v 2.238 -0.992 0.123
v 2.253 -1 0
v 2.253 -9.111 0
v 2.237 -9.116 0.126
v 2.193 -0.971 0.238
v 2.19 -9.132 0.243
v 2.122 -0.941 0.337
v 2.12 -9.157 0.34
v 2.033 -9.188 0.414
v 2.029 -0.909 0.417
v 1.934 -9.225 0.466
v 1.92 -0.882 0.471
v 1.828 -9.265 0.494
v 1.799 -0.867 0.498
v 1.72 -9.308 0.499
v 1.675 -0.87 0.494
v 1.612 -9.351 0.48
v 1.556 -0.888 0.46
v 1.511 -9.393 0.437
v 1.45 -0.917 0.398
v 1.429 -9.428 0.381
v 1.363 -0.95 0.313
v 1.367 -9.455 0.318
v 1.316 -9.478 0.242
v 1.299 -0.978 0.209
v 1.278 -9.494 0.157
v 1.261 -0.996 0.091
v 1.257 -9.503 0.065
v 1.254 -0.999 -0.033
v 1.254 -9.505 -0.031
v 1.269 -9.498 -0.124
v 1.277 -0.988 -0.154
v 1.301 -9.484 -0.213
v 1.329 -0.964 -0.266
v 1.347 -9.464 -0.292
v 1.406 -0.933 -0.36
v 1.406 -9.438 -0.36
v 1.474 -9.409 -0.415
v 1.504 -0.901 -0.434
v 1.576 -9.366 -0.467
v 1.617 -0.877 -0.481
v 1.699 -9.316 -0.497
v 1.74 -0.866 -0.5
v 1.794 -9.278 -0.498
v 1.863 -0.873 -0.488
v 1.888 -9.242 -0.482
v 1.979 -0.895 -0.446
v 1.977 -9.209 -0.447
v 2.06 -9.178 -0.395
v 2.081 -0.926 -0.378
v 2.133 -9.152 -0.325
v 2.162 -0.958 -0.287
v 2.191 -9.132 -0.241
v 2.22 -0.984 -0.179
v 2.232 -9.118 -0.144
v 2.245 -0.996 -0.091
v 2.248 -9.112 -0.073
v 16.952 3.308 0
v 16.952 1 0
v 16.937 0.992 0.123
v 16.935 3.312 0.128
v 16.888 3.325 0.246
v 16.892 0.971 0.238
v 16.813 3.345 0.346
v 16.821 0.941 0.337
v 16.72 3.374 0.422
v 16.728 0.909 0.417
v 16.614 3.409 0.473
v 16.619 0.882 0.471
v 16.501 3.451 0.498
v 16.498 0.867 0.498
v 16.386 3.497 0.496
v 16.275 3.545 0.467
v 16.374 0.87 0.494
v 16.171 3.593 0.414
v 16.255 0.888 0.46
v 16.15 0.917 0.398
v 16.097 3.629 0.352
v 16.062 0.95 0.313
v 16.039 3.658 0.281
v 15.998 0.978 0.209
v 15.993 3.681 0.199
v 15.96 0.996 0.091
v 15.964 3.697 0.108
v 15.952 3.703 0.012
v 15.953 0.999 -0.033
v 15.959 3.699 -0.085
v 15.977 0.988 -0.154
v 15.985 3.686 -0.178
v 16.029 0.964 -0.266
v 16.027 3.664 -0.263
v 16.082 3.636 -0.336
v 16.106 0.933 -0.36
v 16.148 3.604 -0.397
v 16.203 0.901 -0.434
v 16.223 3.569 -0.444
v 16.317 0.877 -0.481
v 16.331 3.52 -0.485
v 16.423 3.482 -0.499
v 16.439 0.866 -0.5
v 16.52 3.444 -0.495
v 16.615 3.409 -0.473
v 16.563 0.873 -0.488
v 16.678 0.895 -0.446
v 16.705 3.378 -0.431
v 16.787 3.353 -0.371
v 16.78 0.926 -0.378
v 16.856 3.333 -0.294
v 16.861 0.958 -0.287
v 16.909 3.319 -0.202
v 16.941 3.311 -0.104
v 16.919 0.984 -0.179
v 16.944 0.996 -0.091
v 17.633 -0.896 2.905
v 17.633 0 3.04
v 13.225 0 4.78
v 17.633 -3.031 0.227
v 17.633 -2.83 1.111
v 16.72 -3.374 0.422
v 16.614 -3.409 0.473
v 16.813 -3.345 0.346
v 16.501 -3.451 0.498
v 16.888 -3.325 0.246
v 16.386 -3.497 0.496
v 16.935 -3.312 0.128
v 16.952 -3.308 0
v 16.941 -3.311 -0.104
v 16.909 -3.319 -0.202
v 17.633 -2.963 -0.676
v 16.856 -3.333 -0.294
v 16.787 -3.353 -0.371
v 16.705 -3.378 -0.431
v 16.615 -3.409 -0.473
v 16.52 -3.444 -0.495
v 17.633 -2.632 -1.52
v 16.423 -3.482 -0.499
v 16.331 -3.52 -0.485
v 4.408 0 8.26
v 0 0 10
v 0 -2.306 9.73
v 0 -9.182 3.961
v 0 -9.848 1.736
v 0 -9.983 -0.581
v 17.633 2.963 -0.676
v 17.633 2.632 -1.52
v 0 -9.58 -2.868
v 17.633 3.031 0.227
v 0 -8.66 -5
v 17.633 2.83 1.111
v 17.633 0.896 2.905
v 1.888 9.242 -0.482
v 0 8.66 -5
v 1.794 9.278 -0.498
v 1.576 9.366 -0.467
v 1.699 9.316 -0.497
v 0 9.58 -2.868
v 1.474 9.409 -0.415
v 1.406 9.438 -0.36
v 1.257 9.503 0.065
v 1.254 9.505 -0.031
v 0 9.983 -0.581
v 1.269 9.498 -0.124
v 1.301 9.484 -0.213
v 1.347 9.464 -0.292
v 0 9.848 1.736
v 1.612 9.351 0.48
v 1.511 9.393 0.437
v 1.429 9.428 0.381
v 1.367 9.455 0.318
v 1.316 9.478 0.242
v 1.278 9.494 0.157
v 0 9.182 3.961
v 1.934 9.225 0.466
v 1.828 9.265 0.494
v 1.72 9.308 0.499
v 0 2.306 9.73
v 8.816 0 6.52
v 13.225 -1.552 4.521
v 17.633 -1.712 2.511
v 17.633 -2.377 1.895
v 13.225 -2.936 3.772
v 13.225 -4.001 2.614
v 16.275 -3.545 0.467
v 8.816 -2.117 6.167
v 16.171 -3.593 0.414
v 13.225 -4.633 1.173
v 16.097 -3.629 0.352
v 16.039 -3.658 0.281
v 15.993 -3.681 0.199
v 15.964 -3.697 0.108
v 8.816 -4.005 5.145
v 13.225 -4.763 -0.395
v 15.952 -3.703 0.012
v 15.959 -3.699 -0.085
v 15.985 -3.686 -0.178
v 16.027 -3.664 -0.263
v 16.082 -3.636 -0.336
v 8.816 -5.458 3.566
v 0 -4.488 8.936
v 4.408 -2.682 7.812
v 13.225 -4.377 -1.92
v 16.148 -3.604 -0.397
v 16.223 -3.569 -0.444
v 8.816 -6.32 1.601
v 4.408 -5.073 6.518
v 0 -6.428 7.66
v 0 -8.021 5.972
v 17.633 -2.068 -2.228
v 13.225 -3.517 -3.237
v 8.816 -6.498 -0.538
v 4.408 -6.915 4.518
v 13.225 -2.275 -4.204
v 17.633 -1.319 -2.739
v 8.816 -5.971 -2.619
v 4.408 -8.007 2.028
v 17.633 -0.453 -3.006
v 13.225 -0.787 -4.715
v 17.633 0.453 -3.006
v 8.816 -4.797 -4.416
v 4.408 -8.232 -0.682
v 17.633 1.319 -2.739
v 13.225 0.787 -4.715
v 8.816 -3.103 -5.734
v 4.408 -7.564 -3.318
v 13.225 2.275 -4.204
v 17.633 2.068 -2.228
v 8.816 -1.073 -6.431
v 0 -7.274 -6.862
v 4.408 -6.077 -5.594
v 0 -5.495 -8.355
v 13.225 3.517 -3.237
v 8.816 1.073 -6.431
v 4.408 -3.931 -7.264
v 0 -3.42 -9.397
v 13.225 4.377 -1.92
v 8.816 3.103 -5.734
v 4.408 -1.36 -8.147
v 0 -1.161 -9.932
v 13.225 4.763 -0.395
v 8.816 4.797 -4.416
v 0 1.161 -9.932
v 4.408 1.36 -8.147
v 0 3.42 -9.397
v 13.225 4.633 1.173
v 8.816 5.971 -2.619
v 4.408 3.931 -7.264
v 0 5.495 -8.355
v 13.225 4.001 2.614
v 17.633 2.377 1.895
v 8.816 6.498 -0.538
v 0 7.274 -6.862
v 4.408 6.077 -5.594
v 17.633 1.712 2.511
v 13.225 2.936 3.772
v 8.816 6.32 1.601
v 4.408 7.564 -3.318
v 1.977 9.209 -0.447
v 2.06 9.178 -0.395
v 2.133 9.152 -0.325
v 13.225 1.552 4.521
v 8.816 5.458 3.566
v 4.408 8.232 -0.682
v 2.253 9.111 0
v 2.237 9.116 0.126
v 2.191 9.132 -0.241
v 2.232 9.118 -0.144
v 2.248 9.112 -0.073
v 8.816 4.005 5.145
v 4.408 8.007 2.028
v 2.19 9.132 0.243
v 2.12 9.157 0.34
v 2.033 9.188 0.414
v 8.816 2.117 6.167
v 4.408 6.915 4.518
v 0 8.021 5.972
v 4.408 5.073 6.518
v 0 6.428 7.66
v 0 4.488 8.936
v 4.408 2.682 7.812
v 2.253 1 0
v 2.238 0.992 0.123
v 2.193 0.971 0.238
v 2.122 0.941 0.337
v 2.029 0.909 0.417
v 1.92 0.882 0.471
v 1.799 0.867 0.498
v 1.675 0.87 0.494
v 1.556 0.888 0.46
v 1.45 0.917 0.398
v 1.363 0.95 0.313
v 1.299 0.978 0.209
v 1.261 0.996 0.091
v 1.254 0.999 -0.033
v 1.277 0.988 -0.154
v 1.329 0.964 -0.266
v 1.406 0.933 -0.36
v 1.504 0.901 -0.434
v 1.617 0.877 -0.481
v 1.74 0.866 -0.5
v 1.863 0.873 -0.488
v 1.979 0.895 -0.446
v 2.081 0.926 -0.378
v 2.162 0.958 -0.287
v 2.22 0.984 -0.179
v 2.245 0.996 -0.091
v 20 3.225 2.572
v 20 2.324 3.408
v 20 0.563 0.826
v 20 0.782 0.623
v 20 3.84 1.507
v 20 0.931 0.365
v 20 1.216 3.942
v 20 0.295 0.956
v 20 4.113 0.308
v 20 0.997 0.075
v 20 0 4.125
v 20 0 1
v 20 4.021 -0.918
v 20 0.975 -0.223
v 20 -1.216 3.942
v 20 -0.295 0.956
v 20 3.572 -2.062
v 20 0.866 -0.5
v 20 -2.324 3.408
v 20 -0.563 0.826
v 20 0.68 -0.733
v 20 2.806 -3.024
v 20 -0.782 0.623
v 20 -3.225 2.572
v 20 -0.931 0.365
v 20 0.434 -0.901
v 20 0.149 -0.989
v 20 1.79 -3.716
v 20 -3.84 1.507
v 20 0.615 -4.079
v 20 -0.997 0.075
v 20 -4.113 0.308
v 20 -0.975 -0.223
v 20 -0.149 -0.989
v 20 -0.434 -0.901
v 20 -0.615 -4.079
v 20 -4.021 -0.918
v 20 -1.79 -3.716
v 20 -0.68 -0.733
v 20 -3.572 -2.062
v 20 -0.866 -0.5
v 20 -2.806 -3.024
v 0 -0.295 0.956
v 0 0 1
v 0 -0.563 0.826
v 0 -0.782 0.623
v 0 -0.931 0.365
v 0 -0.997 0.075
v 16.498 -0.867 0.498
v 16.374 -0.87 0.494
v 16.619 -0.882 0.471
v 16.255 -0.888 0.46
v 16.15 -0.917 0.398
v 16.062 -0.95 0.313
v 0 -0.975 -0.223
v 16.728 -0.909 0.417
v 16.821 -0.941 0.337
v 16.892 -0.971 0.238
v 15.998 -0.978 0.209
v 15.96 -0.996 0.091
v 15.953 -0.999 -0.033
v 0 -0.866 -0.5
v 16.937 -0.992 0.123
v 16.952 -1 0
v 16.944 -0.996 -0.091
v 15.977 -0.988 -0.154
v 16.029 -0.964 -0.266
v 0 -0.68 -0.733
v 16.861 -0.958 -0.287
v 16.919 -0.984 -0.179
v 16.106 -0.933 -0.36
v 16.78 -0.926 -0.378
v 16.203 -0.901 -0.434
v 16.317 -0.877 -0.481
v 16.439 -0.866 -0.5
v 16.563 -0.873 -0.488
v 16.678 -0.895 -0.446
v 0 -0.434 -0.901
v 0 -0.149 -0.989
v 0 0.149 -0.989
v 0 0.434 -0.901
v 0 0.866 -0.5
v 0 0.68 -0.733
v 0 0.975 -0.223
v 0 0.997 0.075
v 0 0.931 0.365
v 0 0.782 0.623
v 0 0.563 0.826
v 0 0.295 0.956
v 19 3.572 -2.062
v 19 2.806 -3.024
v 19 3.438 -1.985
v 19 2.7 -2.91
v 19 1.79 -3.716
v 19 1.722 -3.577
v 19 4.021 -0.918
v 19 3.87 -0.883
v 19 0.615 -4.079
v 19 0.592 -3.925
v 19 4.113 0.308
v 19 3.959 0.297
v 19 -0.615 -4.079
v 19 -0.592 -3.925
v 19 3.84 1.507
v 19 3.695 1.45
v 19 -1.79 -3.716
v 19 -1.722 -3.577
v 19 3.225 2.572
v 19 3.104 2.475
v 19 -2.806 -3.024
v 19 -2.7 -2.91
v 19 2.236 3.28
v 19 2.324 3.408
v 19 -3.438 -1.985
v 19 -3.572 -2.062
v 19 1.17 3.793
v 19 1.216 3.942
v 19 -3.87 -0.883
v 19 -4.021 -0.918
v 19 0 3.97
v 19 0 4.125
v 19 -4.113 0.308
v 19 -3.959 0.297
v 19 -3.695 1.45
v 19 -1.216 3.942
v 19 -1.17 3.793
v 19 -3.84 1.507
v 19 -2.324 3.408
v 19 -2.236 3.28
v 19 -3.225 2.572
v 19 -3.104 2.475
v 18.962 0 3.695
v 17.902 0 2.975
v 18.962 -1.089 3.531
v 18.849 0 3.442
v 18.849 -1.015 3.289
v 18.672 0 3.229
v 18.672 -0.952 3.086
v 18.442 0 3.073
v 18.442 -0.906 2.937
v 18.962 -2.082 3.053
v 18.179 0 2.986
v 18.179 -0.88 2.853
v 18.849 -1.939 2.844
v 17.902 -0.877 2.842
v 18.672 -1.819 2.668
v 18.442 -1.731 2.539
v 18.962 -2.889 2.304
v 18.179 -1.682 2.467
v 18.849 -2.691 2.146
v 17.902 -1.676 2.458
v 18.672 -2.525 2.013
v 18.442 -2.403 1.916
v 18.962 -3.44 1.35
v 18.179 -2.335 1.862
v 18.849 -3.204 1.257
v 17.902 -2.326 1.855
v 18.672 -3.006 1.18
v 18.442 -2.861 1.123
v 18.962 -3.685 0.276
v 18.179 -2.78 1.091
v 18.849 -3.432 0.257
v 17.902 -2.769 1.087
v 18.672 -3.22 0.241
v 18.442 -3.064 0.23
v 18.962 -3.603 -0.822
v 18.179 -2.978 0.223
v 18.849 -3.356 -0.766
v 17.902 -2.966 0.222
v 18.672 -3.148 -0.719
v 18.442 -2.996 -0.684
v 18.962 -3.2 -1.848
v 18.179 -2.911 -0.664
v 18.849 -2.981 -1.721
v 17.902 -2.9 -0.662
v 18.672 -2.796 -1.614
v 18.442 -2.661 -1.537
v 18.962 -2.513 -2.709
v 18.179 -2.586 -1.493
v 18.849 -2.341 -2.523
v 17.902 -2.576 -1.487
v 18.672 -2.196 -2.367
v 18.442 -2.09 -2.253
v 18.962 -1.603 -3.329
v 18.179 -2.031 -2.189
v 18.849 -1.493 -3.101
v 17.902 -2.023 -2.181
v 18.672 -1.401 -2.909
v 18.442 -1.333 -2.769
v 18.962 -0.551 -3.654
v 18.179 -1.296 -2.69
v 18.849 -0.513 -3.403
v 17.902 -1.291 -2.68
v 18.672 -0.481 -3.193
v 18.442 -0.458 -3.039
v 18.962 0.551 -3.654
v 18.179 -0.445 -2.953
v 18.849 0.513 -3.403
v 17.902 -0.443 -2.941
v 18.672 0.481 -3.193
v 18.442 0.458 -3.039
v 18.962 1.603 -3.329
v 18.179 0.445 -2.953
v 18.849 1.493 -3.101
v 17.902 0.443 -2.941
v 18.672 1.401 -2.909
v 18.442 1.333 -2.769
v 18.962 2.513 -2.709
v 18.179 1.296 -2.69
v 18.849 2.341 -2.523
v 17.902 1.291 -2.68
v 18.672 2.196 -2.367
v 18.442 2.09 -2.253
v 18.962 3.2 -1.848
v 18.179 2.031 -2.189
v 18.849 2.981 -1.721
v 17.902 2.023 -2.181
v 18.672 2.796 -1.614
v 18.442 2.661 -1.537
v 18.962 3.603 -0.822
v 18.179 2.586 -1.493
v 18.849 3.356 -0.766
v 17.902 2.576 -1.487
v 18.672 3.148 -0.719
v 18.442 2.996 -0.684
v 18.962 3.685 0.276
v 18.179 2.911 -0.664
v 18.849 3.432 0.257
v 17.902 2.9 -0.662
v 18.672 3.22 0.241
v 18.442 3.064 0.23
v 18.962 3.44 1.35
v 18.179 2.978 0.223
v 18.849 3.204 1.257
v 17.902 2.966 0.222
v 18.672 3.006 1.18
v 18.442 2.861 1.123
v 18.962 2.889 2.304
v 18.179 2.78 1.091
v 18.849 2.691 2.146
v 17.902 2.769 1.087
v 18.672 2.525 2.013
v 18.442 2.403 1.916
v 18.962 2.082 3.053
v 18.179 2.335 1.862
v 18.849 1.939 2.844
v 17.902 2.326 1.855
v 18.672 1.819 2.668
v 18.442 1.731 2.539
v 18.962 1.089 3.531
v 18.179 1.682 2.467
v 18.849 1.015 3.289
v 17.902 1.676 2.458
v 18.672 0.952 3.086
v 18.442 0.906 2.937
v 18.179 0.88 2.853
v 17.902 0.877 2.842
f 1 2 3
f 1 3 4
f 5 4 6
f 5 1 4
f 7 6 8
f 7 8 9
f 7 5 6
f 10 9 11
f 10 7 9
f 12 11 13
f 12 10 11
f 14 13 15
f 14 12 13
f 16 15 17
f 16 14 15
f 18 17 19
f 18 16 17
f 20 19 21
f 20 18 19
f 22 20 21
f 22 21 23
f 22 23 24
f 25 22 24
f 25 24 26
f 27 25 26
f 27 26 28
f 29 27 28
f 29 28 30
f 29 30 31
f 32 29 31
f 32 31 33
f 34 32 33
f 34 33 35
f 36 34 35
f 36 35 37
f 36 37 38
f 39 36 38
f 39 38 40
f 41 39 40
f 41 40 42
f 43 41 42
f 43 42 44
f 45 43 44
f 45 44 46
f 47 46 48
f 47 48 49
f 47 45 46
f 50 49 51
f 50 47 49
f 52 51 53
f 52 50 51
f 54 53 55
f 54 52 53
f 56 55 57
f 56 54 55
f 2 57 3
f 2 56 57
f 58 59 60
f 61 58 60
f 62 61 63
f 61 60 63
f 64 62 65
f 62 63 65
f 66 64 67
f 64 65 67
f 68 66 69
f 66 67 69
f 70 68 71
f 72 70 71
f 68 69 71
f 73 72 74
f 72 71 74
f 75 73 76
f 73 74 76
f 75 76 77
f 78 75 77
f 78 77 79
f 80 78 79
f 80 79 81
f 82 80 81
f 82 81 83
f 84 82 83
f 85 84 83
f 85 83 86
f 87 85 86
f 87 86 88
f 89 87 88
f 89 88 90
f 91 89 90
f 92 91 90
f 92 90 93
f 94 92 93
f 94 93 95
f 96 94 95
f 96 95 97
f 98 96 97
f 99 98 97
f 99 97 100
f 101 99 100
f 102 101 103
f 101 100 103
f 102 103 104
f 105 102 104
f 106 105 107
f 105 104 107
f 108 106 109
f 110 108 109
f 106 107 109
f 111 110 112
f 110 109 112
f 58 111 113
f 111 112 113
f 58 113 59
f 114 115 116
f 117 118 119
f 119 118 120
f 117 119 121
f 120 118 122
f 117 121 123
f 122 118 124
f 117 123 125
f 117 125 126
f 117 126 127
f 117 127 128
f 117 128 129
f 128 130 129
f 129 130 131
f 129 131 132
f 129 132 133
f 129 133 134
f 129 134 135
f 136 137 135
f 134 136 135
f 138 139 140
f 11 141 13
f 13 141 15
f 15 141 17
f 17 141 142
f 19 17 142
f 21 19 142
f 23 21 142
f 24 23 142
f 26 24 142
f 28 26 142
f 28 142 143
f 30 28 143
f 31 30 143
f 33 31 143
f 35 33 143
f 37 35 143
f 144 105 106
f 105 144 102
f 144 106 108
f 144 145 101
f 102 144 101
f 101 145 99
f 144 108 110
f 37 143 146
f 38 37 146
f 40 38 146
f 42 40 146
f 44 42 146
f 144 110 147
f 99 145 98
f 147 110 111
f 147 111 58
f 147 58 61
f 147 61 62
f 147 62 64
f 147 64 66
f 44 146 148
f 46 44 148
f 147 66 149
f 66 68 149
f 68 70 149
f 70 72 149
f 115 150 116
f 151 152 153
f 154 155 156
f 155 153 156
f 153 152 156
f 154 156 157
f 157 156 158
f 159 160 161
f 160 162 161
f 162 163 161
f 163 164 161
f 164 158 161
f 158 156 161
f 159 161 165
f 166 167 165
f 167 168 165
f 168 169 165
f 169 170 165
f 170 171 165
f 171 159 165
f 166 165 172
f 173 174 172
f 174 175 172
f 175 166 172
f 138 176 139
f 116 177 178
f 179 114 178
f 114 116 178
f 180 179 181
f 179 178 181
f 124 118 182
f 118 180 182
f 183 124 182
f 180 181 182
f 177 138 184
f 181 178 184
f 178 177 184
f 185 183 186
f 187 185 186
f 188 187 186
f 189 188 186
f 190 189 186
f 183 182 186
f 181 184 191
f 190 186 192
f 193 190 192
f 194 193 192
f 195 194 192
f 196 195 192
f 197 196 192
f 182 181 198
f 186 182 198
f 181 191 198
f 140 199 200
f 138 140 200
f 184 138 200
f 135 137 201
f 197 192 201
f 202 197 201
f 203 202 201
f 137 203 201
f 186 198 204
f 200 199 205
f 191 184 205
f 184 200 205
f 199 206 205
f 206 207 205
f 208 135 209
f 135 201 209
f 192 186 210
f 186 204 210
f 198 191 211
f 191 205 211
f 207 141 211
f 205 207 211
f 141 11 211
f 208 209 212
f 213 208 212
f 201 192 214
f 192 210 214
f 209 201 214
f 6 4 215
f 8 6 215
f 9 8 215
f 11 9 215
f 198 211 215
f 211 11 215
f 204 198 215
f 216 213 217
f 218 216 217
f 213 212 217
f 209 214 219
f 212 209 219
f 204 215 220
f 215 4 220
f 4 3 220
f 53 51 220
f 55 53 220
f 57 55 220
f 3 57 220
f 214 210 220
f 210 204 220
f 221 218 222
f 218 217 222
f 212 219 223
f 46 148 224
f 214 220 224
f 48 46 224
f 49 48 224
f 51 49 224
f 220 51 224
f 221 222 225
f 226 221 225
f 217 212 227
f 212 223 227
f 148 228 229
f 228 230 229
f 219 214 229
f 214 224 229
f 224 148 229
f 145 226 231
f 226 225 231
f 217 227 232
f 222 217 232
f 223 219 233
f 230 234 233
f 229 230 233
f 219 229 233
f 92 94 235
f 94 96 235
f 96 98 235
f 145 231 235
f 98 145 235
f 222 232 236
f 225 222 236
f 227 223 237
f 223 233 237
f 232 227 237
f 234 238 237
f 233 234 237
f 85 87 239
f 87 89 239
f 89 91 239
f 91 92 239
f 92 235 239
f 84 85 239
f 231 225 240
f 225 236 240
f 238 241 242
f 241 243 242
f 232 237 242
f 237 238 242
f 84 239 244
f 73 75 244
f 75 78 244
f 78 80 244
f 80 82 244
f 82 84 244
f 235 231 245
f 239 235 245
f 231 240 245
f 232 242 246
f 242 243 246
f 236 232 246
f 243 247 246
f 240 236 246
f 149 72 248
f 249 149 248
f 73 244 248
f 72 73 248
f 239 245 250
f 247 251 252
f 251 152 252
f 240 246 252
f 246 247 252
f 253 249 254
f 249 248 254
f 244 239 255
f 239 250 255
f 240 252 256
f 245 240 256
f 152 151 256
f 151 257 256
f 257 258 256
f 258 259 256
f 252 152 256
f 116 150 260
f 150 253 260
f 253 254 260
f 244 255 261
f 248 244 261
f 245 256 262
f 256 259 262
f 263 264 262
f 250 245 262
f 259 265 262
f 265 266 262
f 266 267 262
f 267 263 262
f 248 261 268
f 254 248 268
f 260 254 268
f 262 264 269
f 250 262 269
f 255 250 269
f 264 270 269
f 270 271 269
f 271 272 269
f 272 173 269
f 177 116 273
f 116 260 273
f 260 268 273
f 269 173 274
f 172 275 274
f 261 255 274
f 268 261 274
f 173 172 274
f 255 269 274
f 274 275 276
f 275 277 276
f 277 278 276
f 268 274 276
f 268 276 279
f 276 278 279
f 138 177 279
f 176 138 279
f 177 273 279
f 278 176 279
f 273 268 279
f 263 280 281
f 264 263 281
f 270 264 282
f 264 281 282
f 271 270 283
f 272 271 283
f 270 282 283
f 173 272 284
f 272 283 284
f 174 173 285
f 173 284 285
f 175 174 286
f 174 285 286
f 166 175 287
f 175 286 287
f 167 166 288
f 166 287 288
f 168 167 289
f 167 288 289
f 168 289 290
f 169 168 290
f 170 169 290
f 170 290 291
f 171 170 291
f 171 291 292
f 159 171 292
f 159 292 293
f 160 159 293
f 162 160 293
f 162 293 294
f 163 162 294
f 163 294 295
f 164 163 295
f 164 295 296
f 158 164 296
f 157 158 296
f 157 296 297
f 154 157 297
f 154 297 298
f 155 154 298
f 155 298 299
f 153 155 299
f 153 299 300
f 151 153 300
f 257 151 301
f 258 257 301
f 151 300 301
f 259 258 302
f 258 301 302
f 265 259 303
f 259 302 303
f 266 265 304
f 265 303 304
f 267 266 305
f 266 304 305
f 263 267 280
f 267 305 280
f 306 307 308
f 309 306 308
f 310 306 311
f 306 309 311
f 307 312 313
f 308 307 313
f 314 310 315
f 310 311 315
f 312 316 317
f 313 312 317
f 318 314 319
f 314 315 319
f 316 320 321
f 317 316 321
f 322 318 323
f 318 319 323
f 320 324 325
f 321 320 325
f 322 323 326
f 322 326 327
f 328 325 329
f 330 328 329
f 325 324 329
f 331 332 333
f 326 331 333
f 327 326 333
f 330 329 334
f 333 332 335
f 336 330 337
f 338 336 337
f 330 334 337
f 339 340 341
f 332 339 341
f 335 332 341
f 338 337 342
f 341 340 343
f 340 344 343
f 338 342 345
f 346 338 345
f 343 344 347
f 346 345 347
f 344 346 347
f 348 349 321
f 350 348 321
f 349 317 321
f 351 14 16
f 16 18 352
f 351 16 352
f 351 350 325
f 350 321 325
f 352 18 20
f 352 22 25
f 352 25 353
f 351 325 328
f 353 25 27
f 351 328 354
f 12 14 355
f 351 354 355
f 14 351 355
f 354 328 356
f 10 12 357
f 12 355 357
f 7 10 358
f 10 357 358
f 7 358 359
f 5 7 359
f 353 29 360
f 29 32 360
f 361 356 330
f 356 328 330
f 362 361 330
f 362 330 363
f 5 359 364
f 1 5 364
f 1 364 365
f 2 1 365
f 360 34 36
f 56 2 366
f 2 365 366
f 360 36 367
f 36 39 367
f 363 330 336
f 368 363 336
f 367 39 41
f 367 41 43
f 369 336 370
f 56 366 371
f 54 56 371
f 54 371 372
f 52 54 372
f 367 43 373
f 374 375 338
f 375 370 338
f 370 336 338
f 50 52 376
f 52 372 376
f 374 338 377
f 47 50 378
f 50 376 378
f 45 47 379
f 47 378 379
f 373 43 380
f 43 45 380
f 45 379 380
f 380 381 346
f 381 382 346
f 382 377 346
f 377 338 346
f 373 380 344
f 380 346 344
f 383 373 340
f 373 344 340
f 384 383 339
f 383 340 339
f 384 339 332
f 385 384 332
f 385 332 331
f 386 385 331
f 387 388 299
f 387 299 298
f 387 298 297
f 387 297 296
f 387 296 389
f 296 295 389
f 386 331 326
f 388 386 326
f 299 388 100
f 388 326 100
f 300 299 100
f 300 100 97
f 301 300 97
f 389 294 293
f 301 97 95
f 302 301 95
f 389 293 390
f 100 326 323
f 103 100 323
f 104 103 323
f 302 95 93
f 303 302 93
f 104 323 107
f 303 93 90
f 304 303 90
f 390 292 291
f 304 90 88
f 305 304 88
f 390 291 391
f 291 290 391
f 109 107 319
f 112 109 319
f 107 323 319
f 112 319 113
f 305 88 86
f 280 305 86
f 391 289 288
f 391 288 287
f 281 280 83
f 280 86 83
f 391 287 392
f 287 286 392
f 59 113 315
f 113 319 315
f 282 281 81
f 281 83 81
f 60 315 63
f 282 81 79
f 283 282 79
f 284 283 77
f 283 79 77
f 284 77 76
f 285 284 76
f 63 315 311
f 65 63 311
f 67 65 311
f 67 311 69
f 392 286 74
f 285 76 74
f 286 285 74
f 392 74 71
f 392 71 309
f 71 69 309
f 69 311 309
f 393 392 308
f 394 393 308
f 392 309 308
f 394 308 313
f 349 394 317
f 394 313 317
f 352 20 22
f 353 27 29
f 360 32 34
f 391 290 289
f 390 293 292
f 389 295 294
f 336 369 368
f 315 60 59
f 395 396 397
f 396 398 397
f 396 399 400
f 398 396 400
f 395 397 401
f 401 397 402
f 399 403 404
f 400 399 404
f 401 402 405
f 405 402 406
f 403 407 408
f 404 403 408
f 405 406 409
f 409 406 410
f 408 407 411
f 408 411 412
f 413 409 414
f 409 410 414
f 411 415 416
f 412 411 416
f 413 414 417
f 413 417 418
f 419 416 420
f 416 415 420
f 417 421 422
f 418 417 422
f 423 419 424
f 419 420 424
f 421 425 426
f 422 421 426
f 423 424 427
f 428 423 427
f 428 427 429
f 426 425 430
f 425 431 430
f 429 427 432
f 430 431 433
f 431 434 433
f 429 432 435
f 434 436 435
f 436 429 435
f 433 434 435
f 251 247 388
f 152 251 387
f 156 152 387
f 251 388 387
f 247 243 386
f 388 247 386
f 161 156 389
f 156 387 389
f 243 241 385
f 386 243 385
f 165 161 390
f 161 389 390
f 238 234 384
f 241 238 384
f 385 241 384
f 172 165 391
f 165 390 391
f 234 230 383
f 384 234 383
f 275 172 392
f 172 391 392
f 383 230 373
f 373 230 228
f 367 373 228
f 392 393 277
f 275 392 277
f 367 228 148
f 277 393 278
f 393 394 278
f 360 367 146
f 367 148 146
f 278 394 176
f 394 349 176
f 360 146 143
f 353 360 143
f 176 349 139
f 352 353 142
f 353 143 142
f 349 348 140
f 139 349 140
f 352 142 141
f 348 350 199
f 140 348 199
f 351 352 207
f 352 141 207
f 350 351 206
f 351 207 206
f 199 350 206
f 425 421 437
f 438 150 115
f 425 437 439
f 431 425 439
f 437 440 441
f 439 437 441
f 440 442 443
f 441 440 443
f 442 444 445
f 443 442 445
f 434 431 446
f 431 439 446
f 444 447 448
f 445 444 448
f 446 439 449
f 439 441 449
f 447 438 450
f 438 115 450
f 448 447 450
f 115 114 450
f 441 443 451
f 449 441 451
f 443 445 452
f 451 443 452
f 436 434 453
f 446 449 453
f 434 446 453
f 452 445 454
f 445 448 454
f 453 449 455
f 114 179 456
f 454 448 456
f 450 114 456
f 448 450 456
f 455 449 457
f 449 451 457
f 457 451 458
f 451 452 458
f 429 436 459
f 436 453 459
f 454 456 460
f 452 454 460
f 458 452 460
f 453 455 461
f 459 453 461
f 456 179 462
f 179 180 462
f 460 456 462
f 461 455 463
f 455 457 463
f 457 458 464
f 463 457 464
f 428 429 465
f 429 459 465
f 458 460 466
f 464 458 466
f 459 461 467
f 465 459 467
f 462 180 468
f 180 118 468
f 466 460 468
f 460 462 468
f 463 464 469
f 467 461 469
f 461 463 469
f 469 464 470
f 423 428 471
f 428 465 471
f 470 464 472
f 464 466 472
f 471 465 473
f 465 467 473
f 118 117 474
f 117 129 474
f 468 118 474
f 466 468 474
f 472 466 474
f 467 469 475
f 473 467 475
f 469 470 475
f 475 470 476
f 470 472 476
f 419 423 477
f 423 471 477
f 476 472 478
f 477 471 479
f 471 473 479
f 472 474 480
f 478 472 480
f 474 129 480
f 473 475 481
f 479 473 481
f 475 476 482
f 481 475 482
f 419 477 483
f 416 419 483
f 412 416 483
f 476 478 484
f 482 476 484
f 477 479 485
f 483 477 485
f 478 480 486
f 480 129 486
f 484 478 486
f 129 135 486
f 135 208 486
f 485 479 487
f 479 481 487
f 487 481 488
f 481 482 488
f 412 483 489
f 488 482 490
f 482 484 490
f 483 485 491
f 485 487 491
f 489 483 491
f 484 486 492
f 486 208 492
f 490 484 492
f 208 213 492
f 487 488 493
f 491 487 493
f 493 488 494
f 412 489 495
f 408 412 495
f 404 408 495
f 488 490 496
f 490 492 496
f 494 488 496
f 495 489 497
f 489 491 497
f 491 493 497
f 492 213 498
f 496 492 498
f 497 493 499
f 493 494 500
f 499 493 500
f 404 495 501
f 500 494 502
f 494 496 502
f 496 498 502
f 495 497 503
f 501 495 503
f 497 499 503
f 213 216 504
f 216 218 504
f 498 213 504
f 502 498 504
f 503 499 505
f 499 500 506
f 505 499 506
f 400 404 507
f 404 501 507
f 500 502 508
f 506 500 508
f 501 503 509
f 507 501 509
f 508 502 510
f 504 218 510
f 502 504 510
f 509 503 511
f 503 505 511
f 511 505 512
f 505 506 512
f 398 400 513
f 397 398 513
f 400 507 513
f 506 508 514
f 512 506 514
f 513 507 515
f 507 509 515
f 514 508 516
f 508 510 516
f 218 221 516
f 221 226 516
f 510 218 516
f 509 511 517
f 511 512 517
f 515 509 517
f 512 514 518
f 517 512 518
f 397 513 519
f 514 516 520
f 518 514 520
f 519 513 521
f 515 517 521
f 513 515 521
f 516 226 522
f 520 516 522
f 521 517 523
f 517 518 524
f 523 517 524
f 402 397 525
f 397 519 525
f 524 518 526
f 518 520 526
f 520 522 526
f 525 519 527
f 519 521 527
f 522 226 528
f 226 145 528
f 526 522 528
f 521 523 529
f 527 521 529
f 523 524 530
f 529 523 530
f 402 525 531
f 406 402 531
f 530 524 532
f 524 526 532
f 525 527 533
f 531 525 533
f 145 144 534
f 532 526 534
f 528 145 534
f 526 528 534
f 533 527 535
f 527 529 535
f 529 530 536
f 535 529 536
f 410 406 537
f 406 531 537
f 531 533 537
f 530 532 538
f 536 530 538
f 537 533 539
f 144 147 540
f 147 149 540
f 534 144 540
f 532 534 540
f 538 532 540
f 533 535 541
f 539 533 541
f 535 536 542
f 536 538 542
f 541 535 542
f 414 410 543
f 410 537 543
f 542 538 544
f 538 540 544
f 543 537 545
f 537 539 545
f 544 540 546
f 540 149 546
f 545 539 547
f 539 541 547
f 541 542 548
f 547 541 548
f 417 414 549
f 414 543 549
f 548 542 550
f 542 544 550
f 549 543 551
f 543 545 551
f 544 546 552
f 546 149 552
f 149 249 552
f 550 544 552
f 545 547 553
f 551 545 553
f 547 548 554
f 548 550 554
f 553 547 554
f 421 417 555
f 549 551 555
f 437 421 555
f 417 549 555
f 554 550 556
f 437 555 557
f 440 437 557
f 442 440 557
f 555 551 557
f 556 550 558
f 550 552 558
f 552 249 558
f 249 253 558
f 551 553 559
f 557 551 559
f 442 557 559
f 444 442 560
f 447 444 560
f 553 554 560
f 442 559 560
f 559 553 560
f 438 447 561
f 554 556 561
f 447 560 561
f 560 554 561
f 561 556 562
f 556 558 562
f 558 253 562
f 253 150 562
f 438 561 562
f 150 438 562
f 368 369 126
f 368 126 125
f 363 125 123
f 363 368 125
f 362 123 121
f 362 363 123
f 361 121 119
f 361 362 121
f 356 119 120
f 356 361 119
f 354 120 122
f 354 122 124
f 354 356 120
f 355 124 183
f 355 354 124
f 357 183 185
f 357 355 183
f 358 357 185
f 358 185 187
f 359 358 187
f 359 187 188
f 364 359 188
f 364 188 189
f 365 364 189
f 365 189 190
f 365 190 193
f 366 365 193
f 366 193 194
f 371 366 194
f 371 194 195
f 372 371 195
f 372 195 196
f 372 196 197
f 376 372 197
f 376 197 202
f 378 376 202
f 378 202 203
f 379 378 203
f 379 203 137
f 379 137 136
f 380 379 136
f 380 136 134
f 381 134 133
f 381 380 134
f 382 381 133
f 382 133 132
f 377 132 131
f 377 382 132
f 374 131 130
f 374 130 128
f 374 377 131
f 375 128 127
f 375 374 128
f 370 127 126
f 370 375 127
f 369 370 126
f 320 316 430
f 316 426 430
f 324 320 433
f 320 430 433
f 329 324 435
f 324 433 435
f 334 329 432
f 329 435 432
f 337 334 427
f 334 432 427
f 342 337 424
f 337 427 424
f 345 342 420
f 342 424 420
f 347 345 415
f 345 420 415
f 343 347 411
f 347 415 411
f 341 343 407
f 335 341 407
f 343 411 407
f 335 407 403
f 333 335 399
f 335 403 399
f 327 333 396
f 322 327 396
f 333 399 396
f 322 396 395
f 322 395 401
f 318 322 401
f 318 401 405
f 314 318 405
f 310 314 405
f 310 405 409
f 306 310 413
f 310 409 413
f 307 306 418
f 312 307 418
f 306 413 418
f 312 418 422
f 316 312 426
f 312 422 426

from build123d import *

# Parameters (mm, degrees)
F2_R          = 1
F3_R          = 0.5
F4_DEPTH      = 10.001
F4_DEPTH_BACK = 10.001


with BuildPart() as f1:
    # F0 (on Front) → F1 (revolve)
    with BuildSketch(Plane.XZ):
        Polygon((0, 10), (0, 1), (20, 1), (20, 4.1248017436), (19, 4.1248017436), (19, 2.5), align=None)
    revolve(axis=Axis((8.1747960717, 0, 0), (1, 0, 0)))

    # F2
    f2_edges = [f1.edges().sort_by_distance(p)[0] for p in [
        (19, 0, -2.5),
    ]]
    fillet(f2_edges, radius=F2_R)

    # F3 (on Front) → F4 (cut, two sides)
    with BuildSketch(Plane.XZ) as f4_sk:
        with Locations((1.7530444311, 0)):
            Circle(F3_R)
        with Locations((16.452120617, 0)):
            Circle(F3_R)
    extrude(amount=-F4_DEPTH, mode=Mode.SUBTRACT)
    extrude(f4_sk.sketch, amount=F4_DEPTH_BACK, mode=Mode.SUBTRACT)


solid = f1.part
